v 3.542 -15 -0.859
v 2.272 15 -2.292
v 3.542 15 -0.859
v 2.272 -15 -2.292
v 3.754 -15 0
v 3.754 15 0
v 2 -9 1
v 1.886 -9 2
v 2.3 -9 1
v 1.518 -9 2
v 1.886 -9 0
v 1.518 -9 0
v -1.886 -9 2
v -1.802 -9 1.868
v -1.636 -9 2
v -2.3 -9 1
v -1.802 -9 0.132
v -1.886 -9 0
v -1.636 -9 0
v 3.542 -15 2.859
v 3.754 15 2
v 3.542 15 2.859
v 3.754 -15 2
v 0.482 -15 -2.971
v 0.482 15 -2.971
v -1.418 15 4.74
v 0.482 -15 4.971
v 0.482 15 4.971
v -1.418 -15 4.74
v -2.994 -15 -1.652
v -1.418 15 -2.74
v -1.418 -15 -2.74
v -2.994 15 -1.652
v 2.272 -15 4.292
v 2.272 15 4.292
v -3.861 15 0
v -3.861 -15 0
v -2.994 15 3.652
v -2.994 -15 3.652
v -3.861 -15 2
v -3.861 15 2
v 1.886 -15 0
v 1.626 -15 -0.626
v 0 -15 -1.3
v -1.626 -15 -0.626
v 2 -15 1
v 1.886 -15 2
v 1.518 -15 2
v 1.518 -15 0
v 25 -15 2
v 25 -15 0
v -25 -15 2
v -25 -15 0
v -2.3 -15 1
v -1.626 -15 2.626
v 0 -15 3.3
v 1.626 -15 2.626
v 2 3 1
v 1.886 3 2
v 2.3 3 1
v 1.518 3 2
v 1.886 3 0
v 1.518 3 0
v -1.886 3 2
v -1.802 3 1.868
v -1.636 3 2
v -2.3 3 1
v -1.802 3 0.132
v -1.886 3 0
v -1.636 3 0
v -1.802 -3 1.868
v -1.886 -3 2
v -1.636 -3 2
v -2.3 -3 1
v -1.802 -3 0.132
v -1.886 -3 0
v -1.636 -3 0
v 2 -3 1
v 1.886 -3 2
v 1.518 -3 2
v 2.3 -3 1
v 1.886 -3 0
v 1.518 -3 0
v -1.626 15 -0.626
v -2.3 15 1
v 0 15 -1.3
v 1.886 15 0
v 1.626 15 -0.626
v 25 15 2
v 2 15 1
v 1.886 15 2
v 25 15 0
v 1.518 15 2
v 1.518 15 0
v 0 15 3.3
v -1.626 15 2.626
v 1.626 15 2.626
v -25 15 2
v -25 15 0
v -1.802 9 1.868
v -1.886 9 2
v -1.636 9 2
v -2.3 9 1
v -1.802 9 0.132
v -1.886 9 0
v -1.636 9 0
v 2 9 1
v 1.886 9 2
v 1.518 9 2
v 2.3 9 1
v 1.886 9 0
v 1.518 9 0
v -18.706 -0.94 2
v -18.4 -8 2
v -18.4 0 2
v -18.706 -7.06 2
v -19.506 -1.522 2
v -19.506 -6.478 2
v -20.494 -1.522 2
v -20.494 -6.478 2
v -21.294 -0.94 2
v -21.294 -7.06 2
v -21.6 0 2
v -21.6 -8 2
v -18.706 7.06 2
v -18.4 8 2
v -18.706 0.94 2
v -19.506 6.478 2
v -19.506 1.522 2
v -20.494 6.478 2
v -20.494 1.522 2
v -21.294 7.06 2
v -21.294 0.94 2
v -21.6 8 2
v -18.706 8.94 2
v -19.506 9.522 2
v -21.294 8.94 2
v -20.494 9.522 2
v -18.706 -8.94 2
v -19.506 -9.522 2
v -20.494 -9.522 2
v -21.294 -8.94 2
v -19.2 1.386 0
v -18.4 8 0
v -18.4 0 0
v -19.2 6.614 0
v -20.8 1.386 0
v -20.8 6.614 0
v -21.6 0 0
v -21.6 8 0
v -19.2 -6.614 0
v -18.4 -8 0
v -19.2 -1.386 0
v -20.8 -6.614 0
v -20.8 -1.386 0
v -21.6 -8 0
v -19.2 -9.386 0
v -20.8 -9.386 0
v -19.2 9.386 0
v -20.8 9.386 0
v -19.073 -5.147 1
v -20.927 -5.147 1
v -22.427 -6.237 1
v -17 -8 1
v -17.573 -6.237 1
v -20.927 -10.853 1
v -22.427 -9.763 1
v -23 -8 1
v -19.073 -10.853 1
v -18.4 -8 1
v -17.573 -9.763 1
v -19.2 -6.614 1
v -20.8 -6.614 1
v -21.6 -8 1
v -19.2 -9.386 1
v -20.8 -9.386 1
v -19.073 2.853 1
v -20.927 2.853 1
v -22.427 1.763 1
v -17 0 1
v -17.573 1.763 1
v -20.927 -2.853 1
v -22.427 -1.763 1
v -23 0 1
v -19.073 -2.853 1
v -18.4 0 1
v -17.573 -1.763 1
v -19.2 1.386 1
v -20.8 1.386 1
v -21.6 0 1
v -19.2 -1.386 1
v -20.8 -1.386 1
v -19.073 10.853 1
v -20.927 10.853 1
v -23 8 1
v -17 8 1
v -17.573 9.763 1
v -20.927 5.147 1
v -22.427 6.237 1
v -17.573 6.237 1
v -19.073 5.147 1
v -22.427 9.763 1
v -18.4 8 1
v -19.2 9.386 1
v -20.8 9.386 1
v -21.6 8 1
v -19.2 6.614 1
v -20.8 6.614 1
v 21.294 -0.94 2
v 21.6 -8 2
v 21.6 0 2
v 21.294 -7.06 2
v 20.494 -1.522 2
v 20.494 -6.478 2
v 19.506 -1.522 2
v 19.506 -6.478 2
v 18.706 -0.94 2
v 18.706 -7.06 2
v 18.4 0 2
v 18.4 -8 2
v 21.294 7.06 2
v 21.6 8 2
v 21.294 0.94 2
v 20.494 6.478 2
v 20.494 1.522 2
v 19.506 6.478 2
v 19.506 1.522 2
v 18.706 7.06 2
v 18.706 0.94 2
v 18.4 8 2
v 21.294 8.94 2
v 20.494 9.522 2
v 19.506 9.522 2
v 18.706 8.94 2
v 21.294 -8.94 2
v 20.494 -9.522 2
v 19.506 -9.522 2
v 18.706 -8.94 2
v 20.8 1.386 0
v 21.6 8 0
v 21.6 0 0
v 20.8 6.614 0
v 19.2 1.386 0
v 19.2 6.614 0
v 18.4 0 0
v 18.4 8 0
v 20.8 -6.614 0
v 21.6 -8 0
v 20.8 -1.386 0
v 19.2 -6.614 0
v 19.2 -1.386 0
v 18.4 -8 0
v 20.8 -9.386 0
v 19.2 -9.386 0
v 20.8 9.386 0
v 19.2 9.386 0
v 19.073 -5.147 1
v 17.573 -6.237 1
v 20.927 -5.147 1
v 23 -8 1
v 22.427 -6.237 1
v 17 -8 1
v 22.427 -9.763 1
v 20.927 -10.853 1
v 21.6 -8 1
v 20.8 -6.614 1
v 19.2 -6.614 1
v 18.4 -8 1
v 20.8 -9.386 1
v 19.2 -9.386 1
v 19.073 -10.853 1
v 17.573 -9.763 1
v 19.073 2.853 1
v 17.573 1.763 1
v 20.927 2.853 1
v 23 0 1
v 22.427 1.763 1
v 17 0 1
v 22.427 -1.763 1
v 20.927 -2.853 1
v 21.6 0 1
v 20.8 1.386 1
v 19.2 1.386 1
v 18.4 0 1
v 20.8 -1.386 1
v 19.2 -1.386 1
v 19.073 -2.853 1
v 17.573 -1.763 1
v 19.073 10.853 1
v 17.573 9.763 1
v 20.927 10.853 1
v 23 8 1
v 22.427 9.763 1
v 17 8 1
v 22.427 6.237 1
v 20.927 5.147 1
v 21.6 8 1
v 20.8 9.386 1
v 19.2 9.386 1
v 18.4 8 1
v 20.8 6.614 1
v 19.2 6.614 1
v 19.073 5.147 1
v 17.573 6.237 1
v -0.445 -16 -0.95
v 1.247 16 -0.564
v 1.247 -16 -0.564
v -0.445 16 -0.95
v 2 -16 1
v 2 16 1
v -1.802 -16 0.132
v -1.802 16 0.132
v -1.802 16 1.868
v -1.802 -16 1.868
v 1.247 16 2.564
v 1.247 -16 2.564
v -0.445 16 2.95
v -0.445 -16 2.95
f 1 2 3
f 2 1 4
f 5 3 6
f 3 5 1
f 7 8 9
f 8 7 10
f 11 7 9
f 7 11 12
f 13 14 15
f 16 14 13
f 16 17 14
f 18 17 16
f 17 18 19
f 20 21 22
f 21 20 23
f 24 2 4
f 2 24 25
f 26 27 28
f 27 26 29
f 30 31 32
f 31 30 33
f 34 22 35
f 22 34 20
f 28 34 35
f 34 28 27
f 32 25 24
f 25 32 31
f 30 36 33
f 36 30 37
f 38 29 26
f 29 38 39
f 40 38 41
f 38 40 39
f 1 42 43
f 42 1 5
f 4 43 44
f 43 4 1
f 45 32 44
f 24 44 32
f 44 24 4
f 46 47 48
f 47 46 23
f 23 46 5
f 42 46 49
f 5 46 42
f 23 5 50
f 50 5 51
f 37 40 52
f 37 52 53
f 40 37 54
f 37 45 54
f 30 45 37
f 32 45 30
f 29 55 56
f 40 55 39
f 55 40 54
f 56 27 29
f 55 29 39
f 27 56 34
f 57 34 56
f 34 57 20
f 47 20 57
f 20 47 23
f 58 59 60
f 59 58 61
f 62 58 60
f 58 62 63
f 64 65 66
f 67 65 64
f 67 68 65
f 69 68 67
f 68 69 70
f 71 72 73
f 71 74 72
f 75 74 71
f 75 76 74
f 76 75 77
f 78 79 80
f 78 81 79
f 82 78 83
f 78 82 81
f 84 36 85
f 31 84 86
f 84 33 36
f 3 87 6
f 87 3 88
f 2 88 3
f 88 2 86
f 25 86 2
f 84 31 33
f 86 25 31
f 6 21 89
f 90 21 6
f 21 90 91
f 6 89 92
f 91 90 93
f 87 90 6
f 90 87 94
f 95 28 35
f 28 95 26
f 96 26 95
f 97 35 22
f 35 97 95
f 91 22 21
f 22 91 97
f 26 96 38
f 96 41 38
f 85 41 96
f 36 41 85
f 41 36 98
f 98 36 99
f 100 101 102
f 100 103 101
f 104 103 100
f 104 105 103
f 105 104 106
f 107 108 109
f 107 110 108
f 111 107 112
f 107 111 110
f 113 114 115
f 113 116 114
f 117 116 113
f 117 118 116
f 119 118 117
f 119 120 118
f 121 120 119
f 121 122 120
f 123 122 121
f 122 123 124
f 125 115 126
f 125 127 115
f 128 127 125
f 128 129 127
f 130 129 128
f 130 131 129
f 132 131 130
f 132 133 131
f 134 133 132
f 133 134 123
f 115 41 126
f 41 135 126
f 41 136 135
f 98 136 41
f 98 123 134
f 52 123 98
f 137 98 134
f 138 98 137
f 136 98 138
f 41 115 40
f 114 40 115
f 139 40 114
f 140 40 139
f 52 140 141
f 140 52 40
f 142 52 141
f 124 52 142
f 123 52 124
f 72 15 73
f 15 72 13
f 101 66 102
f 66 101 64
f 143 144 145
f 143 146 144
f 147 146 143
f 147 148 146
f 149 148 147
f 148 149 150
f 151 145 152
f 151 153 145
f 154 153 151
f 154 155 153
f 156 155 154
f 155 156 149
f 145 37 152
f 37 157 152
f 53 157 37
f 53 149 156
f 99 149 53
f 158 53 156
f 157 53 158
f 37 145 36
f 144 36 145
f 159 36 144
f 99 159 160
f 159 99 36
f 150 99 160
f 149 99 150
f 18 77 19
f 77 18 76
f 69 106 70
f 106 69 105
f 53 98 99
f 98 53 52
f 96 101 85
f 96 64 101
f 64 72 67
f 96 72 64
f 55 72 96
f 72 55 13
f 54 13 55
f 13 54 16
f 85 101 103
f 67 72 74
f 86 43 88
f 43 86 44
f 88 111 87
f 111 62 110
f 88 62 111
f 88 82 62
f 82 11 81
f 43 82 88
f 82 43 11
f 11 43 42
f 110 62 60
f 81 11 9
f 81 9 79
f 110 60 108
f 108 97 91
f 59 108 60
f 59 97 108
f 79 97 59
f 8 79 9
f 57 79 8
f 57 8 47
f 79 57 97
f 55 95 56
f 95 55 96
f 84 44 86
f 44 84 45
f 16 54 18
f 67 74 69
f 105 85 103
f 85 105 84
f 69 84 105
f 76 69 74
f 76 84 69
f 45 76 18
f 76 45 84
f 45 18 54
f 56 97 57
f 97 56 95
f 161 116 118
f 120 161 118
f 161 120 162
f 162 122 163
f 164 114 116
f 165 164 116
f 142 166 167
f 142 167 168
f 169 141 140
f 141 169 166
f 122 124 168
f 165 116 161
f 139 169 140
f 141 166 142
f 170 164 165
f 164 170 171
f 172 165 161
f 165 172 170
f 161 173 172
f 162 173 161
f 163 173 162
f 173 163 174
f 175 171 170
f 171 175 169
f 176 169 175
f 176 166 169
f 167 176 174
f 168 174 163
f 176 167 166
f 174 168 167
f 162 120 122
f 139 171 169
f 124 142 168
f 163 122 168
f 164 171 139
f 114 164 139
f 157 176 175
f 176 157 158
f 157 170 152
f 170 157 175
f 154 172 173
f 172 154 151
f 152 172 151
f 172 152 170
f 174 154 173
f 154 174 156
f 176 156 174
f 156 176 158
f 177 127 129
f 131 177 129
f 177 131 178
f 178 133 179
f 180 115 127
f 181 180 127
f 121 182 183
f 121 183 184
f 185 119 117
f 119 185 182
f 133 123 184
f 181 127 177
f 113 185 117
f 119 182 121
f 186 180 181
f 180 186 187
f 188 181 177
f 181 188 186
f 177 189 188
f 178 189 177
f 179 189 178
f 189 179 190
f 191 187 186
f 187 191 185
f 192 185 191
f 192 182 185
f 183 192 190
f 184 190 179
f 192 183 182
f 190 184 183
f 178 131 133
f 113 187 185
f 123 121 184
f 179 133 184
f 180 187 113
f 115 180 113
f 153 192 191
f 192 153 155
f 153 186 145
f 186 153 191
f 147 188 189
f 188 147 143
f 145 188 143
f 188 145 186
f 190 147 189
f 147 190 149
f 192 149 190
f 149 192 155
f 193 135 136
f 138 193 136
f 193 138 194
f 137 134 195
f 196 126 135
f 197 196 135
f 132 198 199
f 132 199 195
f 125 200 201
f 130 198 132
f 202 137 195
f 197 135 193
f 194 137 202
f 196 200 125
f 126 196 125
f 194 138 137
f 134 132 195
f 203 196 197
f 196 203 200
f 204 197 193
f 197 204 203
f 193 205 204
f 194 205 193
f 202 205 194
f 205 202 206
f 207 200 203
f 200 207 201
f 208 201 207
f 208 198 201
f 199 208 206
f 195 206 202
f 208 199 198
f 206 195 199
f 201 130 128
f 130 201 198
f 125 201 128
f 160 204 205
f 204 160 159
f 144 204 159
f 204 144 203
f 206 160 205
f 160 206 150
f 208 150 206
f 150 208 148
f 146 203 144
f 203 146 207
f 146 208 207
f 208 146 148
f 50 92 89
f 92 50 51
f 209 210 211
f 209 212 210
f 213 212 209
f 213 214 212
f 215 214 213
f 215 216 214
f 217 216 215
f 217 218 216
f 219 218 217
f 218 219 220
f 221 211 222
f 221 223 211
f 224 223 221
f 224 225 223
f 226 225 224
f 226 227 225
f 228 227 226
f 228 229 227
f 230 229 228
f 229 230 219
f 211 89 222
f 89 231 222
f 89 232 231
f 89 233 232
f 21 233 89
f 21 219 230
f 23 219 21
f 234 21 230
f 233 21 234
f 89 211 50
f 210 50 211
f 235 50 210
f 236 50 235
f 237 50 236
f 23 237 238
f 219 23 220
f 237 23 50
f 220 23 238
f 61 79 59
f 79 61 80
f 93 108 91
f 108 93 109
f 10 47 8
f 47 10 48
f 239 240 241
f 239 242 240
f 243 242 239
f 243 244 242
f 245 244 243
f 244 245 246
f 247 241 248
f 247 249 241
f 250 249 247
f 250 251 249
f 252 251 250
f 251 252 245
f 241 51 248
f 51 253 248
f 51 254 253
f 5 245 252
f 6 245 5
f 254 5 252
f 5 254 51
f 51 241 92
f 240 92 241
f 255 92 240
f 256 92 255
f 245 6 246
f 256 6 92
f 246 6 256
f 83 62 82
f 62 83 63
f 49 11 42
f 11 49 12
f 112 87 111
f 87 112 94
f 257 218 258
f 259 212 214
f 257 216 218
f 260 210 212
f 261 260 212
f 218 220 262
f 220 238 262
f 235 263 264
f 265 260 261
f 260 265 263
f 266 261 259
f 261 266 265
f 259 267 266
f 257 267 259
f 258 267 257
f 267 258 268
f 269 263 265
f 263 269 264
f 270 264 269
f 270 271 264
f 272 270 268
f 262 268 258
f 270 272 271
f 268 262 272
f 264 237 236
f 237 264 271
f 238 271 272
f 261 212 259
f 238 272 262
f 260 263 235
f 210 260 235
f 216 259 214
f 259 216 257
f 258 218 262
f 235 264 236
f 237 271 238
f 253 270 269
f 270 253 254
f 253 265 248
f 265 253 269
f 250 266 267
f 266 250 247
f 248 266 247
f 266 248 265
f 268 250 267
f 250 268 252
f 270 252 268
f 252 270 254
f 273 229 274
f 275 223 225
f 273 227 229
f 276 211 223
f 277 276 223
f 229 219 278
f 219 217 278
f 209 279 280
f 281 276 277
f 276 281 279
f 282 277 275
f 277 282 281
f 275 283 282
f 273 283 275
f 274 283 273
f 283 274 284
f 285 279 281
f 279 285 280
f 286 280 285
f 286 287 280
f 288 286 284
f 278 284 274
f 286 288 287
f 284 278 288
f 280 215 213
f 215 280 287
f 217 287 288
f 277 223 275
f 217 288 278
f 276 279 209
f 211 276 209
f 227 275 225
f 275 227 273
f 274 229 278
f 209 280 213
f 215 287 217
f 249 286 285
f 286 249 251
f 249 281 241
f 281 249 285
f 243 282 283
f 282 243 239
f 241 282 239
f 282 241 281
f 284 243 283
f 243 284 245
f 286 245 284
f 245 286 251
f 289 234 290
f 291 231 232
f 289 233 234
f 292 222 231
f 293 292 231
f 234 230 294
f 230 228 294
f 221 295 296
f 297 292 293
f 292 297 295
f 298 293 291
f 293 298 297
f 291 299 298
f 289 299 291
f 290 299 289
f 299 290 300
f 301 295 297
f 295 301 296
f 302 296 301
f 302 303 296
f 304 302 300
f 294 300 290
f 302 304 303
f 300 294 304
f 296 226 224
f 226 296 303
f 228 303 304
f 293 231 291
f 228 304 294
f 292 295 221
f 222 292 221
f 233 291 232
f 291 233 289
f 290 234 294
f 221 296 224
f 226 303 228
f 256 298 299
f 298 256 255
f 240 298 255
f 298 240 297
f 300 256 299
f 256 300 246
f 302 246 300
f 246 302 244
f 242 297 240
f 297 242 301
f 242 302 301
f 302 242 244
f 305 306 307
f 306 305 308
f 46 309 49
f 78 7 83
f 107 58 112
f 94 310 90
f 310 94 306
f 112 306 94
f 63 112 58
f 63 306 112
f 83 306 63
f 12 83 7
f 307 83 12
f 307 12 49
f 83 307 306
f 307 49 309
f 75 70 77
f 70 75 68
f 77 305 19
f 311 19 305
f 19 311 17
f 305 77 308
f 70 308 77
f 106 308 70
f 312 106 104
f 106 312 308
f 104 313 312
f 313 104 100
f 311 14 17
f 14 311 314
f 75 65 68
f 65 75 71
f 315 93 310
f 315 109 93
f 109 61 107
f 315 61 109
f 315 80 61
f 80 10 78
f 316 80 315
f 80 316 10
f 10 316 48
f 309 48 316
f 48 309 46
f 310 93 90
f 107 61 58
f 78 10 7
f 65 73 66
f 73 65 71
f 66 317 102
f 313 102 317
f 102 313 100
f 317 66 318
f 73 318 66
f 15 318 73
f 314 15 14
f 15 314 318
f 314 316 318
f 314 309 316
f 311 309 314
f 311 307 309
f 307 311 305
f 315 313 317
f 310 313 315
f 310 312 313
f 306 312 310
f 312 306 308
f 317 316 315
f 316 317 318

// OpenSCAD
// Small butt hinge in open 180° configuration

module leaf(side=1) {
  // side = -1 for left leaf, +1 for right leaf
  difference() {
    union() {
      // leaf plate
      translate([ side == 1 ? 0 : -25, -15, 0 ])
        cube([25, 30, 2]);
      // knuckle barrels (outer)
      for (ypt = side == 1 ? [-6, 6] : [-12, 0, 12]) {
        translate([0, ypt, 1])
          rotate([-90, 0, 0])
            cylinder(h=6, r=4, center=true);
      }
    }
    // knuckle barrel inner holes
    for (ypt = side == 1 ? [-6, 6] : [-12, 0, 12]) {
      translate([0, ypt, 1])
        rotate([-90, 0, 0])
          cylinder(h=6, r=2.3, center=true);
    }
    // M3 countersunk screw holes
    for (ypt = [-8, 0, 8]) {
      // countersink: 6mm dia → 3.2mm dia over 1mm depth
      translate([side*20, ypt, 1])
        cylinder(h=1, r1=3, r2=1.6, center=false);
      // through hole 3.2mm dia
      translate([side*20, ypt, 0])
        cylinder(h=1, r=1.6, center=false);
    }
  }
}

// left leaf (x<0)
leaf(-1);
// right leaf (x>0)
leaf(1);

// hinge pin
translate([0, 0, 1])
  rotate([-90, 0, 0])
    cylinder(h=32, r=2, center=true);
